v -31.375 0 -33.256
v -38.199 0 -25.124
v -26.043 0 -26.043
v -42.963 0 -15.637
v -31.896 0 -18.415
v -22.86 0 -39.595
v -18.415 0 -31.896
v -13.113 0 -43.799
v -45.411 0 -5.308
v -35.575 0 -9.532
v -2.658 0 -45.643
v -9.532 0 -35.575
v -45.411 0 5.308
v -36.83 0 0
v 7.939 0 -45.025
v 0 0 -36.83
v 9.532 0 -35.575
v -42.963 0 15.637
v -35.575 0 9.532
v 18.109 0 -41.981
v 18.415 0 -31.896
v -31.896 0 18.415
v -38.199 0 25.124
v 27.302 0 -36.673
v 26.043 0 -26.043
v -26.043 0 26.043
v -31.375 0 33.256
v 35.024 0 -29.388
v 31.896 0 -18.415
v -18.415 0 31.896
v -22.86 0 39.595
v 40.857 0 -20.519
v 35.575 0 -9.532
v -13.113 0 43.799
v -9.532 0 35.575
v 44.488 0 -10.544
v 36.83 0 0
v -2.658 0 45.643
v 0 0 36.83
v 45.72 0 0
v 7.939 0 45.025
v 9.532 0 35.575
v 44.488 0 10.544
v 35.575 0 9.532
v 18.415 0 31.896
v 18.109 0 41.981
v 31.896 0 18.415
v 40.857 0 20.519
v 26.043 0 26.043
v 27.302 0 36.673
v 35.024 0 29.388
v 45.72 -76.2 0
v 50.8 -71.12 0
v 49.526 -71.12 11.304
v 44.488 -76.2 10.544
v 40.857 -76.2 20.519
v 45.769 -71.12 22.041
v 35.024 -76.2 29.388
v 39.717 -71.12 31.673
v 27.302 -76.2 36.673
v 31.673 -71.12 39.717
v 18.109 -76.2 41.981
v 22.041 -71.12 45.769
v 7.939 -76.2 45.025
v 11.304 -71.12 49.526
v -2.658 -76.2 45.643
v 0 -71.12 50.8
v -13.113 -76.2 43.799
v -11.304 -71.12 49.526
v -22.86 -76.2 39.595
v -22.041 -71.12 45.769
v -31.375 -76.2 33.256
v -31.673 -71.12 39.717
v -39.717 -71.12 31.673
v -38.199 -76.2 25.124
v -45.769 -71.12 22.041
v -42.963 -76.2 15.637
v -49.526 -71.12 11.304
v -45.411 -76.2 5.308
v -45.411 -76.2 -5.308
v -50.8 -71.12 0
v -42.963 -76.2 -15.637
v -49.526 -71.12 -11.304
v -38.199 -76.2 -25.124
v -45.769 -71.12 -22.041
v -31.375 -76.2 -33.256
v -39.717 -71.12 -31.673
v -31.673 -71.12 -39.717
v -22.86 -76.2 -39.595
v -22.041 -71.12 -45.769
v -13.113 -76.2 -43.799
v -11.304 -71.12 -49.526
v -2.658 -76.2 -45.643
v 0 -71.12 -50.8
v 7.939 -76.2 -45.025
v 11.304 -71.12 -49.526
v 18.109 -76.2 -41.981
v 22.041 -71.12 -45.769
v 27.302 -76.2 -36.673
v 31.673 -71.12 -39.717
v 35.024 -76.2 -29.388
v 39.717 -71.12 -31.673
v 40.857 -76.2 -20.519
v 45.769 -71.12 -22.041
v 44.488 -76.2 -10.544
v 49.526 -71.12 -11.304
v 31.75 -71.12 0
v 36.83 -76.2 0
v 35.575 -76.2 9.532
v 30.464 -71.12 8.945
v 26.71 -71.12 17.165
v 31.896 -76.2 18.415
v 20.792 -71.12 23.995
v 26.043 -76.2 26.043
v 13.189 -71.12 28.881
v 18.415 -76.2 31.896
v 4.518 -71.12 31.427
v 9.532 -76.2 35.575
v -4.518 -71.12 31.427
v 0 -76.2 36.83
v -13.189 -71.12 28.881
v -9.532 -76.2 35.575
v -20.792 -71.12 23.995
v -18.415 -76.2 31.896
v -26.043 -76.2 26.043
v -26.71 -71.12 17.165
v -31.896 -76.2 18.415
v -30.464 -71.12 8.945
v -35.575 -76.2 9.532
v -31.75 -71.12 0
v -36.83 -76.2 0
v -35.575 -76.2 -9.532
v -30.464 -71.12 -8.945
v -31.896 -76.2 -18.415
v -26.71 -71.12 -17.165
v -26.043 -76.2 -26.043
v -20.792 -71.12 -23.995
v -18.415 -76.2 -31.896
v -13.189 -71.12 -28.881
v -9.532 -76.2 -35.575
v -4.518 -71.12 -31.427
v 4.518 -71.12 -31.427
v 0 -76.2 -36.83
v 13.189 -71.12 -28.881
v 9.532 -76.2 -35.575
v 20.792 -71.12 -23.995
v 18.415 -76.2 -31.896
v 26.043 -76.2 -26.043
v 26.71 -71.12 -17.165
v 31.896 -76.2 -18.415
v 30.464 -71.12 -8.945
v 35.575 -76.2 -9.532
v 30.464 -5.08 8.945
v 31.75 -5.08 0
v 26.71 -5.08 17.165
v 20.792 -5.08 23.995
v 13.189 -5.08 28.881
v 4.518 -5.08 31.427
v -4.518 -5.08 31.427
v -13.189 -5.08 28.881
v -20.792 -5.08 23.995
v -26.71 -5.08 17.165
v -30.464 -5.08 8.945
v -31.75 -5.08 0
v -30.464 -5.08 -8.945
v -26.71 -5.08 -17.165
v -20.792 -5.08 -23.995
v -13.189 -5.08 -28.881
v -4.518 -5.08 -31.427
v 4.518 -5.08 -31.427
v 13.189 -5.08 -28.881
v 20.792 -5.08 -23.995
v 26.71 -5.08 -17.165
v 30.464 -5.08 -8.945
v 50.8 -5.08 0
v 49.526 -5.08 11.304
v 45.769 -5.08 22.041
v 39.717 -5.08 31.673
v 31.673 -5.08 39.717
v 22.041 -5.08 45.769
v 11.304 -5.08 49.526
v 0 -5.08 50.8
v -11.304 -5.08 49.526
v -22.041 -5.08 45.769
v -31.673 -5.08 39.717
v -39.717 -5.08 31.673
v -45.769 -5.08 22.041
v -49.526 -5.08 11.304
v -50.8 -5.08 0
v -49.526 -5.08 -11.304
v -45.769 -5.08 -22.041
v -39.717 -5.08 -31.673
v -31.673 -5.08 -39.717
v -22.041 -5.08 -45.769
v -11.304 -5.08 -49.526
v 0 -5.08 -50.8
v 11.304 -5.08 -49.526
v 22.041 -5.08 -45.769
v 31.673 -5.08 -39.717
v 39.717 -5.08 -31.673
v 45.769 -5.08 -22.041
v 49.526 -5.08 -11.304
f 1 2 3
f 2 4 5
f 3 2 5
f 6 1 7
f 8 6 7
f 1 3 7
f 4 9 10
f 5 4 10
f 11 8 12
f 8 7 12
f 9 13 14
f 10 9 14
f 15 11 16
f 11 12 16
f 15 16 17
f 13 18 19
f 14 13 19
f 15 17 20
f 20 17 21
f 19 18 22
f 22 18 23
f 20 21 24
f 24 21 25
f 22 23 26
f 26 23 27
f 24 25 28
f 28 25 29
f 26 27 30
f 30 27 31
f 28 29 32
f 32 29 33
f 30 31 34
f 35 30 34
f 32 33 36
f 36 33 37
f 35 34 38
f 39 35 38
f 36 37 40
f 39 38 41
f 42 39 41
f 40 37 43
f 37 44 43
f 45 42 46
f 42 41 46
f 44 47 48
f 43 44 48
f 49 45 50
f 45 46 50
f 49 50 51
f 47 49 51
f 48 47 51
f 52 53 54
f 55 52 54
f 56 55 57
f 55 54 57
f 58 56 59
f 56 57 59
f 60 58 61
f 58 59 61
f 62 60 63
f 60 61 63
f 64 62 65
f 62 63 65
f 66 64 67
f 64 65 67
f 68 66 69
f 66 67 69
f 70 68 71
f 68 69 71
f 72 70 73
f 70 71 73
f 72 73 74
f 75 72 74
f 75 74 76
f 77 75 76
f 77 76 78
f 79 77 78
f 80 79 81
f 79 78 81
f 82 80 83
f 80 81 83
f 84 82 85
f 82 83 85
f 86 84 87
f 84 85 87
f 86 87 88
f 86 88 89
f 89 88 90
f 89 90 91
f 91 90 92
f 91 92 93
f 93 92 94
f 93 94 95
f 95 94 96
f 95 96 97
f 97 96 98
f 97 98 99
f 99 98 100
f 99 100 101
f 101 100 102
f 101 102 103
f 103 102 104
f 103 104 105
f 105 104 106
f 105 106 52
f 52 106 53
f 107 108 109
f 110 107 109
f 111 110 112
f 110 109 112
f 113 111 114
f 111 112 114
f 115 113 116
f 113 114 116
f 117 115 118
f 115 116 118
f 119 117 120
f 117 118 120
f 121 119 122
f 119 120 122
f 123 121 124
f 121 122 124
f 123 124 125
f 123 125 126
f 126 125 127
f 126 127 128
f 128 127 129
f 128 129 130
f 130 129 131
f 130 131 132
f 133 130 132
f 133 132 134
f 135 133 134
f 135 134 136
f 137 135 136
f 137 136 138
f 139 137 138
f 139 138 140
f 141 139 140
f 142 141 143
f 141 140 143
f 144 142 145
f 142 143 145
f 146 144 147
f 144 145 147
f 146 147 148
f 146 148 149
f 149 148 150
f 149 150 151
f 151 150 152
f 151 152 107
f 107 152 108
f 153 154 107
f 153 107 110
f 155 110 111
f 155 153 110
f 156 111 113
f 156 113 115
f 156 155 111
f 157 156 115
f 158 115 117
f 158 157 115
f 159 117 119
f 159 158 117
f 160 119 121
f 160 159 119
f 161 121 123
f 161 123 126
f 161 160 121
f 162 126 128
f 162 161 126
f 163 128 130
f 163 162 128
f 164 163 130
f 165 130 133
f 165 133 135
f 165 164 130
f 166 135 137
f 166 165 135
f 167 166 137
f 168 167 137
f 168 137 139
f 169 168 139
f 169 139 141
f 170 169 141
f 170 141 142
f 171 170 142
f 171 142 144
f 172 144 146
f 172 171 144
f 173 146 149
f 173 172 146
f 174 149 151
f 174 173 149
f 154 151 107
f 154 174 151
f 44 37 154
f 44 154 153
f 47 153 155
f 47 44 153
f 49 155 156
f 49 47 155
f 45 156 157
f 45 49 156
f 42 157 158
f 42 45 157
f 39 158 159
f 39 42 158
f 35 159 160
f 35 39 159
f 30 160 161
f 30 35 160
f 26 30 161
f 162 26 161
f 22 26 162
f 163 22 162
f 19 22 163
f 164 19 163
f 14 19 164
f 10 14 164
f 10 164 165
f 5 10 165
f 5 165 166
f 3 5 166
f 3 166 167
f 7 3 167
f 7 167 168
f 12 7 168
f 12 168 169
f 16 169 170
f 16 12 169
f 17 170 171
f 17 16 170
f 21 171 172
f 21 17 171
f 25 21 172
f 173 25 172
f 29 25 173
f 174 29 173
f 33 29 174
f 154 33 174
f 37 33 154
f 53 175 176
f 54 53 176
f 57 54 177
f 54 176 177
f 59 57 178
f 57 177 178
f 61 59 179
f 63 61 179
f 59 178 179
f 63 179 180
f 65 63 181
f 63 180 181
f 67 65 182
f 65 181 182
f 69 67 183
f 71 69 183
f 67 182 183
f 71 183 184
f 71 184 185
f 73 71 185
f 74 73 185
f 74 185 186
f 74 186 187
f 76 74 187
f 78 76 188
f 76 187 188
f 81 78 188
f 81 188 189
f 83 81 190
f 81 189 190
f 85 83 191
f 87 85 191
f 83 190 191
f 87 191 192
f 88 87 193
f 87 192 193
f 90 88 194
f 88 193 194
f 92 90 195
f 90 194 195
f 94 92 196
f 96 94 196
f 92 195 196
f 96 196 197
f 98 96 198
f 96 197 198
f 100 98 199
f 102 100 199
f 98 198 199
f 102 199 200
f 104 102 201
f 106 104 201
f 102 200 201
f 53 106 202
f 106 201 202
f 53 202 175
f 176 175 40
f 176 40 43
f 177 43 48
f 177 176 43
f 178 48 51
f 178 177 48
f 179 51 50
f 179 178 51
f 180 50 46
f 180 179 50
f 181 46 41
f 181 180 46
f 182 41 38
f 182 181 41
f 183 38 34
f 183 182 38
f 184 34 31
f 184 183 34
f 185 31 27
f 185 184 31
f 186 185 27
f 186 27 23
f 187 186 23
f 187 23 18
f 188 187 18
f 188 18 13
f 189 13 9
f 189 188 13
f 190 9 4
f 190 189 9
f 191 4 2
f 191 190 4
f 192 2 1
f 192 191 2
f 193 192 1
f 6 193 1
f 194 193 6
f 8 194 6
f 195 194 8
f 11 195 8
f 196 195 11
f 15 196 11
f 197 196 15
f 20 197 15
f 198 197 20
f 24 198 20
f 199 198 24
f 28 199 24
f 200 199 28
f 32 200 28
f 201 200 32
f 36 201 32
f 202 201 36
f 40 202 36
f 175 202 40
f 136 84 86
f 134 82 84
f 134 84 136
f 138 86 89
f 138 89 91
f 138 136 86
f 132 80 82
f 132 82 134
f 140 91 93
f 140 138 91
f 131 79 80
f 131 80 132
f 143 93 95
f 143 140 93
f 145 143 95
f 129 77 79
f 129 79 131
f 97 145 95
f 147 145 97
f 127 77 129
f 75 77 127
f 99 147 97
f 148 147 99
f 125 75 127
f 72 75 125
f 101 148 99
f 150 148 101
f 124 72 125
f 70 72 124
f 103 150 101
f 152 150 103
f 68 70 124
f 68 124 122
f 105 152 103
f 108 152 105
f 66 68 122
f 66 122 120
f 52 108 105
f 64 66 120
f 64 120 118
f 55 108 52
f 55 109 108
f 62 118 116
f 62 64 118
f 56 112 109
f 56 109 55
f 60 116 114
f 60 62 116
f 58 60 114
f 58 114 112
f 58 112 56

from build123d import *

# Parameters (mm, degrees)
F0_R     = 50.8
F0_R_2   = 31.75
F1_DEPTH = 76.2
F2_SIZE  = 5.08
F3_SIZE  = 5.08


with BuildPart() as f1:
    # F0 (on Front) → F1 (new body)
    with BuildSketch(Plane.XZ):
        Circle(F0_R)
        Circle(F0_R_2, mode=Mode.SUBTRACT)
    extrude(amount=F1_DEPTH)

    # F2
    f2_edges = [f1.edges().sort_by_distance(p)[0] for p in [
        (-31.75, -76.2, 0),
        (-31.75, 0, 0),
    ]]
    chamfer(f2_edges, length=F2_SIZE)

    # F3
    f3_edges = [f1.edges().sort_by_distance(p)[0] for p in [
        (-50.8, -76.2, 0),
        (-50.8, 0, 0),
    ]]
    chamfer(f3_edges, length=F3_SIZE)


solid = f1.part
